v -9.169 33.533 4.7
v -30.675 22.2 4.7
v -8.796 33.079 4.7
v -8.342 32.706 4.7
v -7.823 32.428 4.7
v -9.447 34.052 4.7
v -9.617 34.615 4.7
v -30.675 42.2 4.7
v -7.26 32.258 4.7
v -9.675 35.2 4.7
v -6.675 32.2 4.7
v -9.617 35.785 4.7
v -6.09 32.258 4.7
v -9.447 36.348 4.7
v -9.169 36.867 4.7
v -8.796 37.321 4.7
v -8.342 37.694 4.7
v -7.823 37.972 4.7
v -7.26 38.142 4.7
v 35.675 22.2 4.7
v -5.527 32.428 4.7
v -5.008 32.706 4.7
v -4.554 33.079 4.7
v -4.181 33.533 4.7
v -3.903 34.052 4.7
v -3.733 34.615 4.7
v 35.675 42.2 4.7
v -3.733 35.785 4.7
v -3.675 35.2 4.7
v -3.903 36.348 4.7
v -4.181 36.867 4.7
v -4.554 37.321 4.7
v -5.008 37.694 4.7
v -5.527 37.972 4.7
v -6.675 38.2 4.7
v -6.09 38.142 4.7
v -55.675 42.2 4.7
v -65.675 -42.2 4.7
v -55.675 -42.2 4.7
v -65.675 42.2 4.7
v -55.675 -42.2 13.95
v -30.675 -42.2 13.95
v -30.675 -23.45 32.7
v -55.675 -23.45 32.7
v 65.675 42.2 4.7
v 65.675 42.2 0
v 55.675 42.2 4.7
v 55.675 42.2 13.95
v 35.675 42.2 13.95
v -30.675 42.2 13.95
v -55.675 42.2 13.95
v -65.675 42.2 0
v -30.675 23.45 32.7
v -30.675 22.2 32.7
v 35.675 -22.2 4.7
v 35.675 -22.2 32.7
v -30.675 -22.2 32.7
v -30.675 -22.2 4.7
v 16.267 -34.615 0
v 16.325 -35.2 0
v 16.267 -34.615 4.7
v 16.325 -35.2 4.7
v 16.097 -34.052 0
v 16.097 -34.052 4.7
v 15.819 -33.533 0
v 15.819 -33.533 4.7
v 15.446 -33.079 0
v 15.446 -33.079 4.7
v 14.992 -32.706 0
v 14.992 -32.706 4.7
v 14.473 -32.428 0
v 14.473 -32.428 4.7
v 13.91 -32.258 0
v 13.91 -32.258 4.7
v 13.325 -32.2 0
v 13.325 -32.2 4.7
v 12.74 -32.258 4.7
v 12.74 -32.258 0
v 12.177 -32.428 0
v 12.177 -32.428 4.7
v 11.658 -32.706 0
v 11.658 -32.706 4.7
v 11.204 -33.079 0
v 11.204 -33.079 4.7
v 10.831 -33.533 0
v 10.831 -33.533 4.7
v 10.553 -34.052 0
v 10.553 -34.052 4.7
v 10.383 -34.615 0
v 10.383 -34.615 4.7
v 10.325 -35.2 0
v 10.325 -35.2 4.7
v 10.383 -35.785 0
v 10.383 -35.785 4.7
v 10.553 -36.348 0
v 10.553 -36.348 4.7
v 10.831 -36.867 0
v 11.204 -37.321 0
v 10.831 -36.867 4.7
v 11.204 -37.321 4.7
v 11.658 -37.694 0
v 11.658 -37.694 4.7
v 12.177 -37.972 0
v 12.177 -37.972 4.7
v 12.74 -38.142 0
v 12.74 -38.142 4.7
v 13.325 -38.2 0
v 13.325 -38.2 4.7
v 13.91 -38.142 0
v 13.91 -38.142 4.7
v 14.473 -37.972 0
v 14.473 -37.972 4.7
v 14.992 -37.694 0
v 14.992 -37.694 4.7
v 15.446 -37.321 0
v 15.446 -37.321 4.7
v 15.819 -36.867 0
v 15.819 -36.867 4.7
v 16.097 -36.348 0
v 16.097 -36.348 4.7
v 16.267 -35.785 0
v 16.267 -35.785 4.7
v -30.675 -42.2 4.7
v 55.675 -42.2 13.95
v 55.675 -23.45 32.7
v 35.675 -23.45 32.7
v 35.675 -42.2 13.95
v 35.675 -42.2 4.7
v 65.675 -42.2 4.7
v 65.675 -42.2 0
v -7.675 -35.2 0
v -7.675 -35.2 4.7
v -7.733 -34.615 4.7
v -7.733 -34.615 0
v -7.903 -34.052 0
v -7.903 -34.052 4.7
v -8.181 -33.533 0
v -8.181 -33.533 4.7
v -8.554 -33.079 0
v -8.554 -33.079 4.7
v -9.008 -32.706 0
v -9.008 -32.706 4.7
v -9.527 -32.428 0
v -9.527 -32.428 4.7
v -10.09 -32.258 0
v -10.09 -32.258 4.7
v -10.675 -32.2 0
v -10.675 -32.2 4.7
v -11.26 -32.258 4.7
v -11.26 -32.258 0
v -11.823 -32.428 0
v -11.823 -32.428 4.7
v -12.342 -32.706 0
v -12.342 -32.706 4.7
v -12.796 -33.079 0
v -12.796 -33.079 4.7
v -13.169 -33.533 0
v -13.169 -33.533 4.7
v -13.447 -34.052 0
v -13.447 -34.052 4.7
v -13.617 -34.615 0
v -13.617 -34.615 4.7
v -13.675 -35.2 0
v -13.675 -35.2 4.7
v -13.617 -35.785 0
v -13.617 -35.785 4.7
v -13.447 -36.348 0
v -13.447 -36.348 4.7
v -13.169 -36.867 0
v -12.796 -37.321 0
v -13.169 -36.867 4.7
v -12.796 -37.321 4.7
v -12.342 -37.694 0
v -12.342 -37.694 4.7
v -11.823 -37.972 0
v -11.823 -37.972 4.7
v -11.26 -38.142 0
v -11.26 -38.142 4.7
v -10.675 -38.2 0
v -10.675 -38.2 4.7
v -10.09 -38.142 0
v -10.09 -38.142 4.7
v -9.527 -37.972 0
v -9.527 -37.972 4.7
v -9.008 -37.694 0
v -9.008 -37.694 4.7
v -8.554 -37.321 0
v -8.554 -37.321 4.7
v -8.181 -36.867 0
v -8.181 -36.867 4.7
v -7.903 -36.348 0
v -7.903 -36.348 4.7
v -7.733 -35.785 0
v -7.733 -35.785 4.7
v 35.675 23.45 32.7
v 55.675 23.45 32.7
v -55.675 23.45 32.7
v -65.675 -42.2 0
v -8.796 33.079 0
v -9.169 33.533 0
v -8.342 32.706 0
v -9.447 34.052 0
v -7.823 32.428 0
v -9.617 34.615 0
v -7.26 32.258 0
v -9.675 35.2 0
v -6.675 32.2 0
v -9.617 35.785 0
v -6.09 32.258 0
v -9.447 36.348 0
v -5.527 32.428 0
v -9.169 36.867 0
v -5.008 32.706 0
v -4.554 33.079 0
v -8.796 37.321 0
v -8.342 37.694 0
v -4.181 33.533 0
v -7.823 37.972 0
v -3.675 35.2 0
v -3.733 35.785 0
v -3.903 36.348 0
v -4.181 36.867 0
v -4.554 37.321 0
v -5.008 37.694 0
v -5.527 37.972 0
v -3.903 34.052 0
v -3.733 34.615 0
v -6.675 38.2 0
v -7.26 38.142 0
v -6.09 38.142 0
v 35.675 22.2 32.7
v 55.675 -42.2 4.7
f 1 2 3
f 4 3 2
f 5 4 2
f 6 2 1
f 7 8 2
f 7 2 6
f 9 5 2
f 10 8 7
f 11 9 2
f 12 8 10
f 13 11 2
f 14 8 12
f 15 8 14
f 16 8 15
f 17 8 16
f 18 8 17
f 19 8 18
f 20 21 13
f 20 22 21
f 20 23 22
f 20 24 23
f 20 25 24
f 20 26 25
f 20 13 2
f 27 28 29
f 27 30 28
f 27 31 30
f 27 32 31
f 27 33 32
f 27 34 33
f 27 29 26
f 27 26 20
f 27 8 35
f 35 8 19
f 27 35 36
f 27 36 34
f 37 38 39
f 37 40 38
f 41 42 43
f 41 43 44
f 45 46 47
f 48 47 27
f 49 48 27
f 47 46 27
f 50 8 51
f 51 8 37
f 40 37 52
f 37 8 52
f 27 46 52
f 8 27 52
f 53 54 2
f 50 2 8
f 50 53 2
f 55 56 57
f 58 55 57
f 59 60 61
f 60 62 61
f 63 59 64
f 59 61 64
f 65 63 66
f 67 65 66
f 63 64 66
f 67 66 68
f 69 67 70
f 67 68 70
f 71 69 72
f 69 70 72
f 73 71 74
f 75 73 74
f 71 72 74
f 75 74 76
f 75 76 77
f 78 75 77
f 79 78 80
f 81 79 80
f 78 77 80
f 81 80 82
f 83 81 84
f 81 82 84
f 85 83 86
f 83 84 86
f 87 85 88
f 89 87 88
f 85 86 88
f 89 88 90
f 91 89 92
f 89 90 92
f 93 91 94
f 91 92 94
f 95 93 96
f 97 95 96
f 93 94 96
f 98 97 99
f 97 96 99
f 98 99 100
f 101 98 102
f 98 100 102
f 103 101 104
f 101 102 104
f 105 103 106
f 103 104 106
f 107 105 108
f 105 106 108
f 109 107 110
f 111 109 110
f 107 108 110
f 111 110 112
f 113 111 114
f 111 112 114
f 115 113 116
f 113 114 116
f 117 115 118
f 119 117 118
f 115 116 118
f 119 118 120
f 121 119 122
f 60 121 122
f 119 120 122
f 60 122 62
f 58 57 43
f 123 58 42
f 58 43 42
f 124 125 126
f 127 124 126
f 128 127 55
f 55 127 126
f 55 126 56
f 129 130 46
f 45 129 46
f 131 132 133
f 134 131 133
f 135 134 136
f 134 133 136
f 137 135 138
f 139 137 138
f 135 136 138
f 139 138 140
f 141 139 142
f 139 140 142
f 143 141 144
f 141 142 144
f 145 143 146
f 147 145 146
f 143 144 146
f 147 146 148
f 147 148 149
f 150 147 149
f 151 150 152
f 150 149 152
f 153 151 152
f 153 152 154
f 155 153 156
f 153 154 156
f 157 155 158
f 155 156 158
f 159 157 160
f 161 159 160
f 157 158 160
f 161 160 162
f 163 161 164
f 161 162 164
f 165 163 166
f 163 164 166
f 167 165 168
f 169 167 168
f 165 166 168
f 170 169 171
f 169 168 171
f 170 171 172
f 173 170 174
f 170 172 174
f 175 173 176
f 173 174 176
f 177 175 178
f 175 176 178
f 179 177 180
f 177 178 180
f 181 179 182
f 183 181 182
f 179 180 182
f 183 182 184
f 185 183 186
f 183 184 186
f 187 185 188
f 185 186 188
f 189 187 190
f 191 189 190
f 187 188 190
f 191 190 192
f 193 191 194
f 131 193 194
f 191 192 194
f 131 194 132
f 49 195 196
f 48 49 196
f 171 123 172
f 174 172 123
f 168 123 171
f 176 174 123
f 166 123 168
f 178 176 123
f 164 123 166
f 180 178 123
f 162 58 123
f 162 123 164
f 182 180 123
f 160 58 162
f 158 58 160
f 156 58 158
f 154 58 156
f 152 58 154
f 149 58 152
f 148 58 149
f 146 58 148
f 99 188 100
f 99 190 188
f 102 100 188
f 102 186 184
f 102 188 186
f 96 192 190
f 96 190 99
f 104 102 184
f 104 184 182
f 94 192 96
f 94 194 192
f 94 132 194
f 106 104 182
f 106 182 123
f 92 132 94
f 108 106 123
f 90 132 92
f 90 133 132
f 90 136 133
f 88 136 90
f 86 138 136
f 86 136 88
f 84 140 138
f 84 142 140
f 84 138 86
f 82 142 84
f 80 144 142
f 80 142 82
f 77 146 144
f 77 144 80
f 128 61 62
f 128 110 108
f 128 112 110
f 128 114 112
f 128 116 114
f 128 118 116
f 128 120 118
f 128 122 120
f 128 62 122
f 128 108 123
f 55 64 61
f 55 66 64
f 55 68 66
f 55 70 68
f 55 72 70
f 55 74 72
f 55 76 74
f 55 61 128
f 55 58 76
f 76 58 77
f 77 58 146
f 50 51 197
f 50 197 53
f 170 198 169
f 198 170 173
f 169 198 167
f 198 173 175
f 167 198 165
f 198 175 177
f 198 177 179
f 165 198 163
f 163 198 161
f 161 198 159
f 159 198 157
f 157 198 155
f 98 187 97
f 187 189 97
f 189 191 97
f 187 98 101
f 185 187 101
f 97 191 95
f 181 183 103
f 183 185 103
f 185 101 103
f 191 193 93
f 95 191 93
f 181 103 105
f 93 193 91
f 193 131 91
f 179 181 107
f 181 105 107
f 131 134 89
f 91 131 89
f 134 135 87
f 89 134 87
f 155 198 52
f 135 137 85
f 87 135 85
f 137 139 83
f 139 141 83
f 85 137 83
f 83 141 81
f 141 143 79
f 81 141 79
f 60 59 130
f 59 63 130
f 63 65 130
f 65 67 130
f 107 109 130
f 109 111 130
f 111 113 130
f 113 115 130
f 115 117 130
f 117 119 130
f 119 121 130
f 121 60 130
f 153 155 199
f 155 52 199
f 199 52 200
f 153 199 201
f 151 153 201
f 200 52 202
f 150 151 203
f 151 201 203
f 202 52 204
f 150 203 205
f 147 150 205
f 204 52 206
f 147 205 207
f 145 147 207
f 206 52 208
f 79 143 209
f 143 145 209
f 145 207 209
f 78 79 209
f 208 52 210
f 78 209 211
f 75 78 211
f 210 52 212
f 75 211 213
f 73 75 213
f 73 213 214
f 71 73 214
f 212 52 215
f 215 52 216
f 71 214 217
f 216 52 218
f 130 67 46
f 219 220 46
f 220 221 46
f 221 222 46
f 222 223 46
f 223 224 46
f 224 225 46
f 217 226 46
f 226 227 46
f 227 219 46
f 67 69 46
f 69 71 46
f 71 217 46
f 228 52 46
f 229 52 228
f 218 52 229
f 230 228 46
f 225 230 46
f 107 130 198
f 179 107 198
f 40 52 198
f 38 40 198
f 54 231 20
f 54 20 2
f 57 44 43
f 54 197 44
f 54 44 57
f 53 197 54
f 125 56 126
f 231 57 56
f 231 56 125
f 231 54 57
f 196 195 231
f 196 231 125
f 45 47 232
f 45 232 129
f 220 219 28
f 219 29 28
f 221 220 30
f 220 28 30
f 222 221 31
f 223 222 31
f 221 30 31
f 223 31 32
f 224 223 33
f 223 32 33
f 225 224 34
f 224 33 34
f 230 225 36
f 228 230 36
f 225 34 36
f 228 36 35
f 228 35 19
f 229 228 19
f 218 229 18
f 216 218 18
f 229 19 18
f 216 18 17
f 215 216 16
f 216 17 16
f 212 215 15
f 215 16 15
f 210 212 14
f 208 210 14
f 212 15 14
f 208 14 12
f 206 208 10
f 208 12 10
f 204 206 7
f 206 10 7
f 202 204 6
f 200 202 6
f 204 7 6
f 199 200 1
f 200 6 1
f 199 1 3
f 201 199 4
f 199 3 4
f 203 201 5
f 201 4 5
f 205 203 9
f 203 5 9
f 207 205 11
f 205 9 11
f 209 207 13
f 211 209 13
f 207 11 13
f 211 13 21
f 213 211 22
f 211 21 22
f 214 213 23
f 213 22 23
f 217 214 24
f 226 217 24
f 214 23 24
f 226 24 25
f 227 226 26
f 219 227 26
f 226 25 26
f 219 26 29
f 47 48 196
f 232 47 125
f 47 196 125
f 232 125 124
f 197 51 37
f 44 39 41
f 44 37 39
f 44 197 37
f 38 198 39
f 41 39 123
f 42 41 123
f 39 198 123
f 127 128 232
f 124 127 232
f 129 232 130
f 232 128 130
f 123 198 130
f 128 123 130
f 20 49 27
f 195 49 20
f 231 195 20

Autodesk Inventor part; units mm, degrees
ref_plane "YZ Plane" through (0, 0, 0) normal (1, 0, 0) x (0, 1, 0)
ref_plane "XZ Plane" through (0, 0, 0) normal (0, 1, 0) x (-1, 0, 0)
ref_plane "XY Plane" through (0, 0, 0) normal (0, 0, 1) x (1, 0, 0)
sketch "Sketch1" plane through (0, 0, 0) normal (0, 0, 1) x (1, 0, 0)
  line L0 (-65.675, -42.2) -> (65.675, -42.2)
  line L1 (65.675, -42.2) -> (65.675, 42.2)
  line L2 (65.675, 42.2) -> (-65.675, 42.2)
  line L3 (-65.675, 42.2) -> (-65.675, -42.2)
  line L4 (-65.675, -42.2) -> (65.675, 42.2) construction
  line L5 (65.675, -42.2) -> (-65.675, 42.2) construction
  point P0 (0, 0)
  dimension "d0" = 131.35
  dimension "d1" = 84.4
extrude "Extrusion1" add sketch "Sketch1" along normal blind 32.7
sketch "Sketch2" plane through (0, 0, 32.7) normal (0, 0, 1) x (1, 0, 0)
  line L0 (65.675, 42.2) -> (-65.675, 42.2) projected
  line L1 (-65.675, -42.2) -> (65.675, -42.2) projected
  line L2 (-30.675, 42.2) -> (35.675, 42.2)
  line L3 (35.675, 42.2) -> (35.675, 22.2)
  line L4 (35.675, 22.2) -> (-30.675, 22.2)
  line L5 (-30.675, 22.2) -> (-30.675, 42.2)
  line L6 (-30.675, -42.2) -> (35.675, -42.2)
  line L7 (35.675, -42.2) -> (35.675, -22.2)
  line L8 (35.675, -22.2) -> (-30.675, -22.2)
  line L9 (-30.675, -22.2) -> (-30.675, -42.2)
  line L10 (65.675, -42.2) -> (65.675, 42.2) projected
  line L11 (-65.675, 42.2) -> (-65.675, -42.2) projected
  line L12 (65.675, 42.2) -> (55.675, 42.2)
  line L13 (55.675, 42.2) -> (55.675, -42.2)
  line L14 (55.675, -42.2) -> (65.675, -42.2)
  line L15 (65.675, -42.2) -> (65.675, 42.2)
  line L16 (-65.675, 42.2) -> (-55.675, 42.2)
  line L17 (-55.675, 42.2) -> (-55.675, -42.2)
  line L18 (-55.675, -42.2) -> (-65.675, -42.2)
  line L19 (-65.675, -42.2) -> (-65.675, 42.2)
  point P0 (0, 0)
  dimension "d5" = 20
  dimension "d6" = 20
  dimension "d7" = 30
  dimension "d8" = 35
  dimension "d9" = 35
  dimension "d10" = 10
  dimension "d11" = 10
extrude "Extrusion2" cut sketch "Sketch2" against normal blind 28 contours L10 L1 L13 L0 | L3 L4 L5 L0 | L1 L9 L8 L7 | L17 L1 L11 L0
chamfer "Chamfer1" distance 18.75 angle 45 4 edges at (-43.175, -42.2, 32.7) (45.675, -42.2, 32.7) (45.675, 42.2, 32.7) (-43.175, 42.2, 32.7)
sketch "Sketch3" plane through (0, 0, 4.7) normal (0, 0, 1) x (1, 0, 0)
  circle A0 centre (-6.675, 35.2) radius 3
  circle A1 centre (-10.675, -35.2) radius 3
  circle A2 centre (13.325, -35.2) radius 3
  line L0 (-30.675, 42.2) -> (35.675, 42.2) projected
  line L1 (35.675, -42.2) -> (55.675, -42.2) projected
  line L2 (-65.675, -42.2) -> (-65.675, 42.2) projected
  point P0 (0, 0)
  dimension "d17" = 24
  dimension "d18" = 20
  dimension "d19" = 70.4
  dimension "d20" = 7
  dimension "d21" = 84.4
  dimension "d22" = 6
  dimension "d23" = 6
  dimension "d24" = 6
  dimension "d25" = 55
  dimension "d26" = 0
extrude "Extrusion3" cut sketch "Sketch3" against normal blind 28
equation "\"d6\" = d5"
equation "\"d9\" = d8"
equation "\"d20\" = -0.5 * d19 + 0.5 * d21"
equation "\"d23\" = d22"
equation "\"d24\" = d22"
properties part number "FuseBox_04980933.X"
